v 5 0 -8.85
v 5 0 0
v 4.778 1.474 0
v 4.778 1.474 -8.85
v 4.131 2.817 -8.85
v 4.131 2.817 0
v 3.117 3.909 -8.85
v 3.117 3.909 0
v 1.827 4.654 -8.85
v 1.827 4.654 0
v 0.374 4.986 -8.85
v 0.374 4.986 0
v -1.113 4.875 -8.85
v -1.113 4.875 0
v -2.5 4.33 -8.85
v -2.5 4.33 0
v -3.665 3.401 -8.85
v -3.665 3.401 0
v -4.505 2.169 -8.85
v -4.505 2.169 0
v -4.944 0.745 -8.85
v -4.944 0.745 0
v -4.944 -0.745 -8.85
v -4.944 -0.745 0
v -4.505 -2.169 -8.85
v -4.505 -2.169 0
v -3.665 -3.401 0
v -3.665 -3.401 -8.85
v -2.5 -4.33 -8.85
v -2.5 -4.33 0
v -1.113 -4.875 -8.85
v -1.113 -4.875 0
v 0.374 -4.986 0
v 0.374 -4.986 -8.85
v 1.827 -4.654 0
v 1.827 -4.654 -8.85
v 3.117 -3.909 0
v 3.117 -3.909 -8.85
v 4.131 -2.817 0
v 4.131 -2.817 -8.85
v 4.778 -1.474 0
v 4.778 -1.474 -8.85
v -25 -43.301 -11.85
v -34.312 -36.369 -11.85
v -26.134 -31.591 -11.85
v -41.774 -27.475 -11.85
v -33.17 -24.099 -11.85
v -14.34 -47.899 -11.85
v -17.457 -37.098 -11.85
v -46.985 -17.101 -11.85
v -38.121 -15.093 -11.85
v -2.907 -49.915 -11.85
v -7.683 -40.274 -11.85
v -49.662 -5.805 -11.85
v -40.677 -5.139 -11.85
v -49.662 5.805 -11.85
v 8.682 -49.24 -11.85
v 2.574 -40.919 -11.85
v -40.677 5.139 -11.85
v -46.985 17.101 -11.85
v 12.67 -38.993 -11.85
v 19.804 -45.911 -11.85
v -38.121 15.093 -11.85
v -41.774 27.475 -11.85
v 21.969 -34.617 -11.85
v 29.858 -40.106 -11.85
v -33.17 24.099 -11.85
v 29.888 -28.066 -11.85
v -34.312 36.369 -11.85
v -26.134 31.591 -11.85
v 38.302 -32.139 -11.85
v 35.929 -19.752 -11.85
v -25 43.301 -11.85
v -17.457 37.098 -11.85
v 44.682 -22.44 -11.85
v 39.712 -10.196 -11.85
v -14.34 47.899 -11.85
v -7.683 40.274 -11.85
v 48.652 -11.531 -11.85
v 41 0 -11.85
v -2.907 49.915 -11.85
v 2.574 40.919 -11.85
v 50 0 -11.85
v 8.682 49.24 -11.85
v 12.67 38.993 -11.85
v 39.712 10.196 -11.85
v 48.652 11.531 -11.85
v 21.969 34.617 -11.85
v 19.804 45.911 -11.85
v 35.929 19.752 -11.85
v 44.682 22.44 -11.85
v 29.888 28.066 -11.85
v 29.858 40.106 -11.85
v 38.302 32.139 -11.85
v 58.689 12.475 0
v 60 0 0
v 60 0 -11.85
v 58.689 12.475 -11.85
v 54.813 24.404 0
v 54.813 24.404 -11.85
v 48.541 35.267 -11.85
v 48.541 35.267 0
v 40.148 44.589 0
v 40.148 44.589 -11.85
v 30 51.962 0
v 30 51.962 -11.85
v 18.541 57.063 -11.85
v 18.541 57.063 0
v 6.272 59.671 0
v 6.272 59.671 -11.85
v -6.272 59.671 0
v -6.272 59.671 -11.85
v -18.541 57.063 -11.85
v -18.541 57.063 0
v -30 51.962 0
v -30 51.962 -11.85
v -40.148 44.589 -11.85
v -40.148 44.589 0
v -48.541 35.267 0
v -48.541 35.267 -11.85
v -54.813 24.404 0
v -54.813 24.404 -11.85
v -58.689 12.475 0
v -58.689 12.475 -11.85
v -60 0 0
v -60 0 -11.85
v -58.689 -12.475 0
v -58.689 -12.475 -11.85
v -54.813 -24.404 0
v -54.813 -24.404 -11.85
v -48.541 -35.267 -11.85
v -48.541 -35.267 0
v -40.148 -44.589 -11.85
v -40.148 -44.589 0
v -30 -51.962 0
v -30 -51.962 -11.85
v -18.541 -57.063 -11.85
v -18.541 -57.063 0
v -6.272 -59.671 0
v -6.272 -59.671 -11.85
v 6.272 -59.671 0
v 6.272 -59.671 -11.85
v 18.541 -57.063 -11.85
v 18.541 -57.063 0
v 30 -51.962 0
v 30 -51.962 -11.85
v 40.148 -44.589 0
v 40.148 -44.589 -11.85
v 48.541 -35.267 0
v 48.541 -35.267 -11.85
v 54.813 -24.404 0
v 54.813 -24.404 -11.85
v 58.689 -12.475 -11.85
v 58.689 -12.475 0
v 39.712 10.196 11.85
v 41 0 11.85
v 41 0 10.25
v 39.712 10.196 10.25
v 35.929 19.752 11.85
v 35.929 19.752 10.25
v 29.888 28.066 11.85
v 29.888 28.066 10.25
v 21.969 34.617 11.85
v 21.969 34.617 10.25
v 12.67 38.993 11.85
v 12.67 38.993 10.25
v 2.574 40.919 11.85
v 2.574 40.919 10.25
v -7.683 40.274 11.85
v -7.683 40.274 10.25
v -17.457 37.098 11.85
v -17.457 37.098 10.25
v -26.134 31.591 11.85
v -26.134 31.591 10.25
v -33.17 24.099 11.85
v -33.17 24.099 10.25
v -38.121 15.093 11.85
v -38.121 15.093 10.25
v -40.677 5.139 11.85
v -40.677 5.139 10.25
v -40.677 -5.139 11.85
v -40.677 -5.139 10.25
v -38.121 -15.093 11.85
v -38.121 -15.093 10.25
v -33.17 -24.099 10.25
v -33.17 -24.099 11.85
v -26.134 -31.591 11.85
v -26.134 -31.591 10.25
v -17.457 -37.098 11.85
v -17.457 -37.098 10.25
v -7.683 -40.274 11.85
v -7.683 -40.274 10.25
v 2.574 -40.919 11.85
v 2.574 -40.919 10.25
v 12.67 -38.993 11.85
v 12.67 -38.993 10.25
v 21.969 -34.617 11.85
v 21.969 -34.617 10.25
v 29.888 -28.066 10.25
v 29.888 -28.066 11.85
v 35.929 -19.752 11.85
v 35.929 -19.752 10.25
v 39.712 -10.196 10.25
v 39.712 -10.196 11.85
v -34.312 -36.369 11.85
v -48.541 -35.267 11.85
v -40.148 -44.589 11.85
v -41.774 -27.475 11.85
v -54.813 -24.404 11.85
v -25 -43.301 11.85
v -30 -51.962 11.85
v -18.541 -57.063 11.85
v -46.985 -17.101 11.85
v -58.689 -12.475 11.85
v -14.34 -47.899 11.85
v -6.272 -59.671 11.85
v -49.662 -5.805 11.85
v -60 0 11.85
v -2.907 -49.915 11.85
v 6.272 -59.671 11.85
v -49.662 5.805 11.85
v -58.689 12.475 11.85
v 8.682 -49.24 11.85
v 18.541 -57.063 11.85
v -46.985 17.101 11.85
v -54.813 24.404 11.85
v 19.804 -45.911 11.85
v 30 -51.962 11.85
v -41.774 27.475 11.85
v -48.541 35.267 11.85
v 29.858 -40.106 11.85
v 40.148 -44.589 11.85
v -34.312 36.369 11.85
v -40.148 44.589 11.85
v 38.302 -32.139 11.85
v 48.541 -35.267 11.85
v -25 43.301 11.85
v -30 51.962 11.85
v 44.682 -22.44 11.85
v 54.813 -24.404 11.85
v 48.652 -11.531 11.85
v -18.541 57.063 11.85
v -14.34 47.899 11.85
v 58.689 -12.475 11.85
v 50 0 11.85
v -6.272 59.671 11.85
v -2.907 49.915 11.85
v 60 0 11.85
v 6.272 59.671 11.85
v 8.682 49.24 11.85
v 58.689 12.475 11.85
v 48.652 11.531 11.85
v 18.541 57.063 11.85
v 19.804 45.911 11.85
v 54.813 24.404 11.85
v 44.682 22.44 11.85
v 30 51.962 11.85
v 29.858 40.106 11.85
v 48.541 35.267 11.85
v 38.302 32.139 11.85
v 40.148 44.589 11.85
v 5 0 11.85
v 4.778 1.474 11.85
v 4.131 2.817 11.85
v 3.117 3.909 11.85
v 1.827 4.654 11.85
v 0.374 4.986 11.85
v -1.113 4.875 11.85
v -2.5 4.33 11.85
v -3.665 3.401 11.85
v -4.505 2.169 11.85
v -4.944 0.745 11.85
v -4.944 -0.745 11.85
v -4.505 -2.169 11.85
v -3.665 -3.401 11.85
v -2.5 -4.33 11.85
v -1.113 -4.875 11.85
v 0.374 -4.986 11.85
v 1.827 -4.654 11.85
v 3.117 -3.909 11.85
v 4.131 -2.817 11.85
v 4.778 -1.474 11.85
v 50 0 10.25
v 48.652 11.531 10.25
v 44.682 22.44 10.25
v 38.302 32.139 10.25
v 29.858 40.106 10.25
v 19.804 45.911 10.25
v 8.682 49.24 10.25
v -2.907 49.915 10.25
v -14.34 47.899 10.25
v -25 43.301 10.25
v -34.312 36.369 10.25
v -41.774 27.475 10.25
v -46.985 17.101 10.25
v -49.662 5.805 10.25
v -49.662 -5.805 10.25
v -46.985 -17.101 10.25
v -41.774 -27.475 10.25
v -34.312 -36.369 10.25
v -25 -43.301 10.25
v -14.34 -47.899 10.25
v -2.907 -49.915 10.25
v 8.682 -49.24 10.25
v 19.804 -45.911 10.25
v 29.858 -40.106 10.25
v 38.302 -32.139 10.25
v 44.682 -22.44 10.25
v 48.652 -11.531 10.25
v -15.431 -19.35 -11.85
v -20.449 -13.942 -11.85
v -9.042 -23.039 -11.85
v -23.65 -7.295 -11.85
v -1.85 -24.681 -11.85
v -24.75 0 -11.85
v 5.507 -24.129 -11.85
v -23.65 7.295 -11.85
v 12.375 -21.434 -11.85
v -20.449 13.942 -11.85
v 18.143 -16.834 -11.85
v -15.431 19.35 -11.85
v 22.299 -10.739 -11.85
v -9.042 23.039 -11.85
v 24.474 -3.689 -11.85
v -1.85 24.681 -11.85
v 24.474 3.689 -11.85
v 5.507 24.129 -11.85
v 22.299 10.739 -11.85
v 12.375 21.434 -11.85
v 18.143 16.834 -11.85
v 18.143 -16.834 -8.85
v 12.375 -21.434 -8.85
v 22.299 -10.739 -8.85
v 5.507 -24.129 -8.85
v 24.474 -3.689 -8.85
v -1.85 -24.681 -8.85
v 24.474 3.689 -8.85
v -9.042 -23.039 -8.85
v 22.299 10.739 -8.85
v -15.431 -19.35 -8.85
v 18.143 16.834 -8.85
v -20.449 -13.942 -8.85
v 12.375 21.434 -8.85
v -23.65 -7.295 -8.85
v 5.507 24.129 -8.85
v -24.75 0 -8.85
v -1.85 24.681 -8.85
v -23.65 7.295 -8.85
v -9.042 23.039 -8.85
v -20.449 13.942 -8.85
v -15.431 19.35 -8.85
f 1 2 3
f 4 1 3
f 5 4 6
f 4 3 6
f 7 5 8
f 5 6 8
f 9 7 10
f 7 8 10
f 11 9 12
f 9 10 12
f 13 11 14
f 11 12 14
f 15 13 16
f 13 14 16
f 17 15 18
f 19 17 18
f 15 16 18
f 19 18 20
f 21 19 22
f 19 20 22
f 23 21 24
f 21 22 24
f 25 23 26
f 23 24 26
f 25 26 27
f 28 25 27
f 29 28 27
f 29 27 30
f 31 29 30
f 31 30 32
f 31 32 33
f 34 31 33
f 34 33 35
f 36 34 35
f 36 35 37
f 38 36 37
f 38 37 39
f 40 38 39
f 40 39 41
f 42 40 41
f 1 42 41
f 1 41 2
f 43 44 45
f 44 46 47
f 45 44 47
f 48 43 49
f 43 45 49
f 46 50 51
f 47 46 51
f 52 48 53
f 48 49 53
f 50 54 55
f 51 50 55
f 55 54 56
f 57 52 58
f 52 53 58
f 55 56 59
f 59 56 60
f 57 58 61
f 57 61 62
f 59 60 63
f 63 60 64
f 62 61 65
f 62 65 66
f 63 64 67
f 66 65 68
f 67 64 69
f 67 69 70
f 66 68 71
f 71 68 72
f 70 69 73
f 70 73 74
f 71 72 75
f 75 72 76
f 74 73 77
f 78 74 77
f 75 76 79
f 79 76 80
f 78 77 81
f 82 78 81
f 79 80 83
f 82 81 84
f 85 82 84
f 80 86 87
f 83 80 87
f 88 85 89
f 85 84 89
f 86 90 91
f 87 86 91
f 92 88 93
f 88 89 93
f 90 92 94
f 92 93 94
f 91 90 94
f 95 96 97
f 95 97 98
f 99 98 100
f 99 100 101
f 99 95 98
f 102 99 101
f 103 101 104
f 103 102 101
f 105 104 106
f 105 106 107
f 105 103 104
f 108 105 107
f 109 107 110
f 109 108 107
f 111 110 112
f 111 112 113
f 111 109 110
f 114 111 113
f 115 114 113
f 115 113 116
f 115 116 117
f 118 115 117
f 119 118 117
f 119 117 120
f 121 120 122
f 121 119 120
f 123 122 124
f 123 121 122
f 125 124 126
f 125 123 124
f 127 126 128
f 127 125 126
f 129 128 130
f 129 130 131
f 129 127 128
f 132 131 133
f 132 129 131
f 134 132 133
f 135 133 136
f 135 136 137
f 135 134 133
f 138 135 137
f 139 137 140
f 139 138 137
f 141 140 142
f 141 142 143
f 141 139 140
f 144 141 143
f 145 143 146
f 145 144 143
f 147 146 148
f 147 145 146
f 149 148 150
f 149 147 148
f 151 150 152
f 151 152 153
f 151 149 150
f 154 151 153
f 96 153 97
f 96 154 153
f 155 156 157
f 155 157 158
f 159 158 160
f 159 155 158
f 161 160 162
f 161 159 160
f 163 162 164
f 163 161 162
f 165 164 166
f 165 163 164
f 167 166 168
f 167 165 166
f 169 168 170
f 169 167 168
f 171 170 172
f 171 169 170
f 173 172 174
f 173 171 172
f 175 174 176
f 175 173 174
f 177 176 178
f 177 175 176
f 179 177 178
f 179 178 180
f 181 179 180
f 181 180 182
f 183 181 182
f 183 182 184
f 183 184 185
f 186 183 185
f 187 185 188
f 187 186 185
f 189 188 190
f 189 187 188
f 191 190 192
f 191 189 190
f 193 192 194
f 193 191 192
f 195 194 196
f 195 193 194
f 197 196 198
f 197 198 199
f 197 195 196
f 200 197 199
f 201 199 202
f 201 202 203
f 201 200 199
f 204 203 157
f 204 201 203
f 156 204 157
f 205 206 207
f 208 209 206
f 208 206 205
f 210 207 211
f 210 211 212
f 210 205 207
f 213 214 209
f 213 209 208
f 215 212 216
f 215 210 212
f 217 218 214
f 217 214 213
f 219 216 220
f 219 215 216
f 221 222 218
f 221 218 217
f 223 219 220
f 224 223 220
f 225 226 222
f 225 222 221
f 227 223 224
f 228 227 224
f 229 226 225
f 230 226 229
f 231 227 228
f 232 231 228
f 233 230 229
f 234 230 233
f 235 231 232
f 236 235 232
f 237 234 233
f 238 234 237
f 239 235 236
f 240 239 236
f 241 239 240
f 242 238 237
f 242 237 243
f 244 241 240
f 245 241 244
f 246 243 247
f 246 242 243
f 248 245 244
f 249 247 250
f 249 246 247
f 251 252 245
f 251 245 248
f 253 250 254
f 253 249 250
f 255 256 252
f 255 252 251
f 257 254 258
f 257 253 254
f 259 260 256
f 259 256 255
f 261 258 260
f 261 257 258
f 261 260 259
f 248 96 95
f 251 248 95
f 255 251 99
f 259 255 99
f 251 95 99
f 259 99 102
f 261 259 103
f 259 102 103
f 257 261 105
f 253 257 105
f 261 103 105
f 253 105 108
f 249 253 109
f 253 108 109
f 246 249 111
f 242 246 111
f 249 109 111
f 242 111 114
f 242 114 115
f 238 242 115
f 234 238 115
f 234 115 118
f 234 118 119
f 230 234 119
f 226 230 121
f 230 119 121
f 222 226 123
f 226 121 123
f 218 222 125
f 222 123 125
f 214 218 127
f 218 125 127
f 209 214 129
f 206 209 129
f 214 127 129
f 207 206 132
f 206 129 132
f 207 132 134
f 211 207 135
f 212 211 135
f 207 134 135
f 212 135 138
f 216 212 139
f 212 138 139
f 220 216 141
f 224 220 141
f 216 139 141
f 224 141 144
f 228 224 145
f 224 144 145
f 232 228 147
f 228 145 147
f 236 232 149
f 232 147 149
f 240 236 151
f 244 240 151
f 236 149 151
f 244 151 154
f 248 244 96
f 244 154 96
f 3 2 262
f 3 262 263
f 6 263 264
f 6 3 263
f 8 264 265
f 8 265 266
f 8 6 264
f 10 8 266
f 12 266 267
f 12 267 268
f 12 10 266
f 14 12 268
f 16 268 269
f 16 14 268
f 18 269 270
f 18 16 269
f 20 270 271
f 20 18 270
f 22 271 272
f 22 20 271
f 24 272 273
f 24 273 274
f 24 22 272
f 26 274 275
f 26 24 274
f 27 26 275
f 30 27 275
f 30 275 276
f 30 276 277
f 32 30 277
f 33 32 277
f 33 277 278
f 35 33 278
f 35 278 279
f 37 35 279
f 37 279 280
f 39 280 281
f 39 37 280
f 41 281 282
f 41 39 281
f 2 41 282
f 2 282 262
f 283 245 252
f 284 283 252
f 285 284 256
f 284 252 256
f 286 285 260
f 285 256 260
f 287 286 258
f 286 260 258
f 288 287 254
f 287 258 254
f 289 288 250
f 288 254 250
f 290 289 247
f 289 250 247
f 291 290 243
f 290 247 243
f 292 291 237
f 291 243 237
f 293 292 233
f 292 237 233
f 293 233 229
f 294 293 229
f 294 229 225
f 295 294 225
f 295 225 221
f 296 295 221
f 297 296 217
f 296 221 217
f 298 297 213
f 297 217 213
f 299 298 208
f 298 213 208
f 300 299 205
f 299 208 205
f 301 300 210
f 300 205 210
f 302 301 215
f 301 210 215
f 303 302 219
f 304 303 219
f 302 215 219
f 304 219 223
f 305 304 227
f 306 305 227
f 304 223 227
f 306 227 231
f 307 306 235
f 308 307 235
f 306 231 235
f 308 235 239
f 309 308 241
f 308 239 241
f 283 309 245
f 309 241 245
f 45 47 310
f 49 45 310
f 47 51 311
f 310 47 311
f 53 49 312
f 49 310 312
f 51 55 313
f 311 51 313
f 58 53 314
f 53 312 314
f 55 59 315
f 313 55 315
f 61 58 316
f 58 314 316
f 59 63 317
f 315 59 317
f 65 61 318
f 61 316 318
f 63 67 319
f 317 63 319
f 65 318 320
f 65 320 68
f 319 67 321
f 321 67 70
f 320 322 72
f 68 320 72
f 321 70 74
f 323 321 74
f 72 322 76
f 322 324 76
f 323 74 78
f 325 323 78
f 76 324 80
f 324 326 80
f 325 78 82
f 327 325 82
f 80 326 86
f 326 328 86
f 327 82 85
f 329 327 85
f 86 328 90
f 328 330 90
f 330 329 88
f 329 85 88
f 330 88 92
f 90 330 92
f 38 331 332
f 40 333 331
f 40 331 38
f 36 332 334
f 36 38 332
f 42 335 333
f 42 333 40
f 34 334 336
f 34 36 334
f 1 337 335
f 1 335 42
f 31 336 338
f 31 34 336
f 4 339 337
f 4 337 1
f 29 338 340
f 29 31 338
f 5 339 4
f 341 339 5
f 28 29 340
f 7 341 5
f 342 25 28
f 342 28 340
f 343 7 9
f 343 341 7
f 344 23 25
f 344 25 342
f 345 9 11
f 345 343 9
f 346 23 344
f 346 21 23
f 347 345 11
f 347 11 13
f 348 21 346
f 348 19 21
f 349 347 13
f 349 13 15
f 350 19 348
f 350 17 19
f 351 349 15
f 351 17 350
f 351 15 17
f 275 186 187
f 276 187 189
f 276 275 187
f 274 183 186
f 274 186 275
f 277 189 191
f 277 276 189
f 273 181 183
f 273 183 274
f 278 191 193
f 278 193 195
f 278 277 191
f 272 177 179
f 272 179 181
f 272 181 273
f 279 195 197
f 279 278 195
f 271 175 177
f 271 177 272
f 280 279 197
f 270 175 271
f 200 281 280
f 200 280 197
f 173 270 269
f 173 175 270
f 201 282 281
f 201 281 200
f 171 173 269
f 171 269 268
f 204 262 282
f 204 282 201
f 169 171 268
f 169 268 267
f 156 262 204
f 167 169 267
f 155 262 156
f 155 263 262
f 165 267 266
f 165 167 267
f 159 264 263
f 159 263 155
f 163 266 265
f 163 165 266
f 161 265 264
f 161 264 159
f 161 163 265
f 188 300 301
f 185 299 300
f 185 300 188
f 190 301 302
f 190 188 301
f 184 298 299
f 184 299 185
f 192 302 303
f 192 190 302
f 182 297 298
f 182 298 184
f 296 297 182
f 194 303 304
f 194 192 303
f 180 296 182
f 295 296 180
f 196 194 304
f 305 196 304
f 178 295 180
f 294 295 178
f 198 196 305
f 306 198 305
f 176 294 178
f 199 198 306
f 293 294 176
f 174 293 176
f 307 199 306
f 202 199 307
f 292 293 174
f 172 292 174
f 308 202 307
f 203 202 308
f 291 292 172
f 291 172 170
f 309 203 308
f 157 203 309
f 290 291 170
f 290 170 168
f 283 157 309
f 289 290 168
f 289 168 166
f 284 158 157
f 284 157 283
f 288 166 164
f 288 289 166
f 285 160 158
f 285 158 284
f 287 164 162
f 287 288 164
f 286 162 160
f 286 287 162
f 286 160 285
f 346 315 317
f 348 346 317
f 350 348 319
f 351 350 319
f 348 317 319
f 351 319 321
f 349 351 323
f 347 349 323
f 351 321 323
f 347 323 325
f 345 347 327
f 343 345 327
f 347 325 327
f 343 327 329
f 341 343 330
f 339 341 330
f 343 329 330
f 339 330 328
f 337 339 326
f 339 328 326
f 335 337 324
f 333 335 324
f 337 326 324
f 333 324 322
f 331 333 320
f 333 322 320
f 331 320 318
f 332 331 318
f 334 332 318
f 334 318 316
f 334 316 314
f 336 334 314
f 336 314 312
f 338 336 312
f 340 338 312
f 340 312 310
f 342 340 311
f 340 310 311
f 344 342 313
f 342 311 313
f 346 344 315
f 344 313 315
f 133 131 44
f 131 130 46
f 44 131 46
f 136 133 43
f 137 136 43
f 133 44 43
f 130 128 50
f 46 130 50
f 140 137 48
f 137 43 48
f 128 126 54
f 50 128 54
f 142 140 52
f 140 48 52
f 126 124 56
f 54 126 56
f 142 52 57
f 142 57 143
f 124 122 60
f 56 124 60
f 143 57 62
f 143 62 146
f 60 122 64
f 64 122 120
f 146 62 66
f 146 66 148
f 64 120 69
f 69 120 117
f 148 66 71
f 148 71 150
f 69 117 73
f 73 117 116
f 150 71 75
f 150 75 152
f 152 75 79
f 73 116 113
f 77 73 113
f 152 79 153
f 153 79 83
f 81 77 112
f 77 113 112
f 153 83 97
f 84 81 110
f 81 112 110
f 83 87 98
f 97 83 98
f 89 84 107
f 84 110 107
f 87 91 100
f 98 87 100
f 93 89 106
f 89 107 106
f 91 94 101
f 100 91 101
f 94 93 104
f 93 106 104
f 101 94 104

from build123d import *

# Parameters (mm, degrees)
SKETCH1_R           = 60
SKETCH1_R_2         = 50
SKETCH1_R_3         = 41
SKETCH1_R_4         = 5
BOSS_EXTRUDE1_DEPTH = 11.85
SKETCH2_R           = 50
SKETCH2_R_2         = 41
CUT_EXTRUDE1_DEPTH  = 1.6
SKETCH3_R           = 24.75
CUT_EXTRUDE2_DEPTH  = 3


with BuildPart() as part:
    # Sketch1 → Boss-Extrude1 (new, symmetric)
    # profile 1 of 3: a face of its own
    with BuildSketch(Plane.XY):
        Circle(SKETCH1_R)
        Circle(SKETCH1_R_2, mode=Mode.SUBTRACT)
    # profile 2 of 3: a face of its own
    with BuildSketch(Plane.XY):
        Circle(SKETCH1_R_2)
        Circle(SKETCH1_R_3, mode=Mode.SUBTRACT)
    # profile 3 of 3: a face of its own
    with BuildSketch(Plane.XY):
        Circle(SKETCH1_R_3)
        Circle(SKETCH1_R_4, mode=Mode.SUBTRACT)
    extrude(amount=BOSS_EXTRUDE1_DEPTH, both=True)

    # Sketch2 → Cut-Extrude1 (cut)
    with BuildSketch(Plane.XY.offset(11.85)):
        Circle(SKETCH2_R)
        Circle(SKETCH2_R_2, mode=Mode.SUBTRACT)
    extrude(amount=-CUT_EXTRUDE1_DEPTH, mode=Mode.SUBTRACT)

    # Sketch3 → Cut-Extrude2 (cut)
    with BuildSketch(Plane(origin=(0, 0, -11.85), x_dir=(-1, 0, 0), z_dir=(0, 0, -1))):
        Circle(SKETCH3_R)
    extrude(amount=-CUT_EXTRUDE2_DEPTH, mode=Mode.SUBTRACT)


solid = part.part
